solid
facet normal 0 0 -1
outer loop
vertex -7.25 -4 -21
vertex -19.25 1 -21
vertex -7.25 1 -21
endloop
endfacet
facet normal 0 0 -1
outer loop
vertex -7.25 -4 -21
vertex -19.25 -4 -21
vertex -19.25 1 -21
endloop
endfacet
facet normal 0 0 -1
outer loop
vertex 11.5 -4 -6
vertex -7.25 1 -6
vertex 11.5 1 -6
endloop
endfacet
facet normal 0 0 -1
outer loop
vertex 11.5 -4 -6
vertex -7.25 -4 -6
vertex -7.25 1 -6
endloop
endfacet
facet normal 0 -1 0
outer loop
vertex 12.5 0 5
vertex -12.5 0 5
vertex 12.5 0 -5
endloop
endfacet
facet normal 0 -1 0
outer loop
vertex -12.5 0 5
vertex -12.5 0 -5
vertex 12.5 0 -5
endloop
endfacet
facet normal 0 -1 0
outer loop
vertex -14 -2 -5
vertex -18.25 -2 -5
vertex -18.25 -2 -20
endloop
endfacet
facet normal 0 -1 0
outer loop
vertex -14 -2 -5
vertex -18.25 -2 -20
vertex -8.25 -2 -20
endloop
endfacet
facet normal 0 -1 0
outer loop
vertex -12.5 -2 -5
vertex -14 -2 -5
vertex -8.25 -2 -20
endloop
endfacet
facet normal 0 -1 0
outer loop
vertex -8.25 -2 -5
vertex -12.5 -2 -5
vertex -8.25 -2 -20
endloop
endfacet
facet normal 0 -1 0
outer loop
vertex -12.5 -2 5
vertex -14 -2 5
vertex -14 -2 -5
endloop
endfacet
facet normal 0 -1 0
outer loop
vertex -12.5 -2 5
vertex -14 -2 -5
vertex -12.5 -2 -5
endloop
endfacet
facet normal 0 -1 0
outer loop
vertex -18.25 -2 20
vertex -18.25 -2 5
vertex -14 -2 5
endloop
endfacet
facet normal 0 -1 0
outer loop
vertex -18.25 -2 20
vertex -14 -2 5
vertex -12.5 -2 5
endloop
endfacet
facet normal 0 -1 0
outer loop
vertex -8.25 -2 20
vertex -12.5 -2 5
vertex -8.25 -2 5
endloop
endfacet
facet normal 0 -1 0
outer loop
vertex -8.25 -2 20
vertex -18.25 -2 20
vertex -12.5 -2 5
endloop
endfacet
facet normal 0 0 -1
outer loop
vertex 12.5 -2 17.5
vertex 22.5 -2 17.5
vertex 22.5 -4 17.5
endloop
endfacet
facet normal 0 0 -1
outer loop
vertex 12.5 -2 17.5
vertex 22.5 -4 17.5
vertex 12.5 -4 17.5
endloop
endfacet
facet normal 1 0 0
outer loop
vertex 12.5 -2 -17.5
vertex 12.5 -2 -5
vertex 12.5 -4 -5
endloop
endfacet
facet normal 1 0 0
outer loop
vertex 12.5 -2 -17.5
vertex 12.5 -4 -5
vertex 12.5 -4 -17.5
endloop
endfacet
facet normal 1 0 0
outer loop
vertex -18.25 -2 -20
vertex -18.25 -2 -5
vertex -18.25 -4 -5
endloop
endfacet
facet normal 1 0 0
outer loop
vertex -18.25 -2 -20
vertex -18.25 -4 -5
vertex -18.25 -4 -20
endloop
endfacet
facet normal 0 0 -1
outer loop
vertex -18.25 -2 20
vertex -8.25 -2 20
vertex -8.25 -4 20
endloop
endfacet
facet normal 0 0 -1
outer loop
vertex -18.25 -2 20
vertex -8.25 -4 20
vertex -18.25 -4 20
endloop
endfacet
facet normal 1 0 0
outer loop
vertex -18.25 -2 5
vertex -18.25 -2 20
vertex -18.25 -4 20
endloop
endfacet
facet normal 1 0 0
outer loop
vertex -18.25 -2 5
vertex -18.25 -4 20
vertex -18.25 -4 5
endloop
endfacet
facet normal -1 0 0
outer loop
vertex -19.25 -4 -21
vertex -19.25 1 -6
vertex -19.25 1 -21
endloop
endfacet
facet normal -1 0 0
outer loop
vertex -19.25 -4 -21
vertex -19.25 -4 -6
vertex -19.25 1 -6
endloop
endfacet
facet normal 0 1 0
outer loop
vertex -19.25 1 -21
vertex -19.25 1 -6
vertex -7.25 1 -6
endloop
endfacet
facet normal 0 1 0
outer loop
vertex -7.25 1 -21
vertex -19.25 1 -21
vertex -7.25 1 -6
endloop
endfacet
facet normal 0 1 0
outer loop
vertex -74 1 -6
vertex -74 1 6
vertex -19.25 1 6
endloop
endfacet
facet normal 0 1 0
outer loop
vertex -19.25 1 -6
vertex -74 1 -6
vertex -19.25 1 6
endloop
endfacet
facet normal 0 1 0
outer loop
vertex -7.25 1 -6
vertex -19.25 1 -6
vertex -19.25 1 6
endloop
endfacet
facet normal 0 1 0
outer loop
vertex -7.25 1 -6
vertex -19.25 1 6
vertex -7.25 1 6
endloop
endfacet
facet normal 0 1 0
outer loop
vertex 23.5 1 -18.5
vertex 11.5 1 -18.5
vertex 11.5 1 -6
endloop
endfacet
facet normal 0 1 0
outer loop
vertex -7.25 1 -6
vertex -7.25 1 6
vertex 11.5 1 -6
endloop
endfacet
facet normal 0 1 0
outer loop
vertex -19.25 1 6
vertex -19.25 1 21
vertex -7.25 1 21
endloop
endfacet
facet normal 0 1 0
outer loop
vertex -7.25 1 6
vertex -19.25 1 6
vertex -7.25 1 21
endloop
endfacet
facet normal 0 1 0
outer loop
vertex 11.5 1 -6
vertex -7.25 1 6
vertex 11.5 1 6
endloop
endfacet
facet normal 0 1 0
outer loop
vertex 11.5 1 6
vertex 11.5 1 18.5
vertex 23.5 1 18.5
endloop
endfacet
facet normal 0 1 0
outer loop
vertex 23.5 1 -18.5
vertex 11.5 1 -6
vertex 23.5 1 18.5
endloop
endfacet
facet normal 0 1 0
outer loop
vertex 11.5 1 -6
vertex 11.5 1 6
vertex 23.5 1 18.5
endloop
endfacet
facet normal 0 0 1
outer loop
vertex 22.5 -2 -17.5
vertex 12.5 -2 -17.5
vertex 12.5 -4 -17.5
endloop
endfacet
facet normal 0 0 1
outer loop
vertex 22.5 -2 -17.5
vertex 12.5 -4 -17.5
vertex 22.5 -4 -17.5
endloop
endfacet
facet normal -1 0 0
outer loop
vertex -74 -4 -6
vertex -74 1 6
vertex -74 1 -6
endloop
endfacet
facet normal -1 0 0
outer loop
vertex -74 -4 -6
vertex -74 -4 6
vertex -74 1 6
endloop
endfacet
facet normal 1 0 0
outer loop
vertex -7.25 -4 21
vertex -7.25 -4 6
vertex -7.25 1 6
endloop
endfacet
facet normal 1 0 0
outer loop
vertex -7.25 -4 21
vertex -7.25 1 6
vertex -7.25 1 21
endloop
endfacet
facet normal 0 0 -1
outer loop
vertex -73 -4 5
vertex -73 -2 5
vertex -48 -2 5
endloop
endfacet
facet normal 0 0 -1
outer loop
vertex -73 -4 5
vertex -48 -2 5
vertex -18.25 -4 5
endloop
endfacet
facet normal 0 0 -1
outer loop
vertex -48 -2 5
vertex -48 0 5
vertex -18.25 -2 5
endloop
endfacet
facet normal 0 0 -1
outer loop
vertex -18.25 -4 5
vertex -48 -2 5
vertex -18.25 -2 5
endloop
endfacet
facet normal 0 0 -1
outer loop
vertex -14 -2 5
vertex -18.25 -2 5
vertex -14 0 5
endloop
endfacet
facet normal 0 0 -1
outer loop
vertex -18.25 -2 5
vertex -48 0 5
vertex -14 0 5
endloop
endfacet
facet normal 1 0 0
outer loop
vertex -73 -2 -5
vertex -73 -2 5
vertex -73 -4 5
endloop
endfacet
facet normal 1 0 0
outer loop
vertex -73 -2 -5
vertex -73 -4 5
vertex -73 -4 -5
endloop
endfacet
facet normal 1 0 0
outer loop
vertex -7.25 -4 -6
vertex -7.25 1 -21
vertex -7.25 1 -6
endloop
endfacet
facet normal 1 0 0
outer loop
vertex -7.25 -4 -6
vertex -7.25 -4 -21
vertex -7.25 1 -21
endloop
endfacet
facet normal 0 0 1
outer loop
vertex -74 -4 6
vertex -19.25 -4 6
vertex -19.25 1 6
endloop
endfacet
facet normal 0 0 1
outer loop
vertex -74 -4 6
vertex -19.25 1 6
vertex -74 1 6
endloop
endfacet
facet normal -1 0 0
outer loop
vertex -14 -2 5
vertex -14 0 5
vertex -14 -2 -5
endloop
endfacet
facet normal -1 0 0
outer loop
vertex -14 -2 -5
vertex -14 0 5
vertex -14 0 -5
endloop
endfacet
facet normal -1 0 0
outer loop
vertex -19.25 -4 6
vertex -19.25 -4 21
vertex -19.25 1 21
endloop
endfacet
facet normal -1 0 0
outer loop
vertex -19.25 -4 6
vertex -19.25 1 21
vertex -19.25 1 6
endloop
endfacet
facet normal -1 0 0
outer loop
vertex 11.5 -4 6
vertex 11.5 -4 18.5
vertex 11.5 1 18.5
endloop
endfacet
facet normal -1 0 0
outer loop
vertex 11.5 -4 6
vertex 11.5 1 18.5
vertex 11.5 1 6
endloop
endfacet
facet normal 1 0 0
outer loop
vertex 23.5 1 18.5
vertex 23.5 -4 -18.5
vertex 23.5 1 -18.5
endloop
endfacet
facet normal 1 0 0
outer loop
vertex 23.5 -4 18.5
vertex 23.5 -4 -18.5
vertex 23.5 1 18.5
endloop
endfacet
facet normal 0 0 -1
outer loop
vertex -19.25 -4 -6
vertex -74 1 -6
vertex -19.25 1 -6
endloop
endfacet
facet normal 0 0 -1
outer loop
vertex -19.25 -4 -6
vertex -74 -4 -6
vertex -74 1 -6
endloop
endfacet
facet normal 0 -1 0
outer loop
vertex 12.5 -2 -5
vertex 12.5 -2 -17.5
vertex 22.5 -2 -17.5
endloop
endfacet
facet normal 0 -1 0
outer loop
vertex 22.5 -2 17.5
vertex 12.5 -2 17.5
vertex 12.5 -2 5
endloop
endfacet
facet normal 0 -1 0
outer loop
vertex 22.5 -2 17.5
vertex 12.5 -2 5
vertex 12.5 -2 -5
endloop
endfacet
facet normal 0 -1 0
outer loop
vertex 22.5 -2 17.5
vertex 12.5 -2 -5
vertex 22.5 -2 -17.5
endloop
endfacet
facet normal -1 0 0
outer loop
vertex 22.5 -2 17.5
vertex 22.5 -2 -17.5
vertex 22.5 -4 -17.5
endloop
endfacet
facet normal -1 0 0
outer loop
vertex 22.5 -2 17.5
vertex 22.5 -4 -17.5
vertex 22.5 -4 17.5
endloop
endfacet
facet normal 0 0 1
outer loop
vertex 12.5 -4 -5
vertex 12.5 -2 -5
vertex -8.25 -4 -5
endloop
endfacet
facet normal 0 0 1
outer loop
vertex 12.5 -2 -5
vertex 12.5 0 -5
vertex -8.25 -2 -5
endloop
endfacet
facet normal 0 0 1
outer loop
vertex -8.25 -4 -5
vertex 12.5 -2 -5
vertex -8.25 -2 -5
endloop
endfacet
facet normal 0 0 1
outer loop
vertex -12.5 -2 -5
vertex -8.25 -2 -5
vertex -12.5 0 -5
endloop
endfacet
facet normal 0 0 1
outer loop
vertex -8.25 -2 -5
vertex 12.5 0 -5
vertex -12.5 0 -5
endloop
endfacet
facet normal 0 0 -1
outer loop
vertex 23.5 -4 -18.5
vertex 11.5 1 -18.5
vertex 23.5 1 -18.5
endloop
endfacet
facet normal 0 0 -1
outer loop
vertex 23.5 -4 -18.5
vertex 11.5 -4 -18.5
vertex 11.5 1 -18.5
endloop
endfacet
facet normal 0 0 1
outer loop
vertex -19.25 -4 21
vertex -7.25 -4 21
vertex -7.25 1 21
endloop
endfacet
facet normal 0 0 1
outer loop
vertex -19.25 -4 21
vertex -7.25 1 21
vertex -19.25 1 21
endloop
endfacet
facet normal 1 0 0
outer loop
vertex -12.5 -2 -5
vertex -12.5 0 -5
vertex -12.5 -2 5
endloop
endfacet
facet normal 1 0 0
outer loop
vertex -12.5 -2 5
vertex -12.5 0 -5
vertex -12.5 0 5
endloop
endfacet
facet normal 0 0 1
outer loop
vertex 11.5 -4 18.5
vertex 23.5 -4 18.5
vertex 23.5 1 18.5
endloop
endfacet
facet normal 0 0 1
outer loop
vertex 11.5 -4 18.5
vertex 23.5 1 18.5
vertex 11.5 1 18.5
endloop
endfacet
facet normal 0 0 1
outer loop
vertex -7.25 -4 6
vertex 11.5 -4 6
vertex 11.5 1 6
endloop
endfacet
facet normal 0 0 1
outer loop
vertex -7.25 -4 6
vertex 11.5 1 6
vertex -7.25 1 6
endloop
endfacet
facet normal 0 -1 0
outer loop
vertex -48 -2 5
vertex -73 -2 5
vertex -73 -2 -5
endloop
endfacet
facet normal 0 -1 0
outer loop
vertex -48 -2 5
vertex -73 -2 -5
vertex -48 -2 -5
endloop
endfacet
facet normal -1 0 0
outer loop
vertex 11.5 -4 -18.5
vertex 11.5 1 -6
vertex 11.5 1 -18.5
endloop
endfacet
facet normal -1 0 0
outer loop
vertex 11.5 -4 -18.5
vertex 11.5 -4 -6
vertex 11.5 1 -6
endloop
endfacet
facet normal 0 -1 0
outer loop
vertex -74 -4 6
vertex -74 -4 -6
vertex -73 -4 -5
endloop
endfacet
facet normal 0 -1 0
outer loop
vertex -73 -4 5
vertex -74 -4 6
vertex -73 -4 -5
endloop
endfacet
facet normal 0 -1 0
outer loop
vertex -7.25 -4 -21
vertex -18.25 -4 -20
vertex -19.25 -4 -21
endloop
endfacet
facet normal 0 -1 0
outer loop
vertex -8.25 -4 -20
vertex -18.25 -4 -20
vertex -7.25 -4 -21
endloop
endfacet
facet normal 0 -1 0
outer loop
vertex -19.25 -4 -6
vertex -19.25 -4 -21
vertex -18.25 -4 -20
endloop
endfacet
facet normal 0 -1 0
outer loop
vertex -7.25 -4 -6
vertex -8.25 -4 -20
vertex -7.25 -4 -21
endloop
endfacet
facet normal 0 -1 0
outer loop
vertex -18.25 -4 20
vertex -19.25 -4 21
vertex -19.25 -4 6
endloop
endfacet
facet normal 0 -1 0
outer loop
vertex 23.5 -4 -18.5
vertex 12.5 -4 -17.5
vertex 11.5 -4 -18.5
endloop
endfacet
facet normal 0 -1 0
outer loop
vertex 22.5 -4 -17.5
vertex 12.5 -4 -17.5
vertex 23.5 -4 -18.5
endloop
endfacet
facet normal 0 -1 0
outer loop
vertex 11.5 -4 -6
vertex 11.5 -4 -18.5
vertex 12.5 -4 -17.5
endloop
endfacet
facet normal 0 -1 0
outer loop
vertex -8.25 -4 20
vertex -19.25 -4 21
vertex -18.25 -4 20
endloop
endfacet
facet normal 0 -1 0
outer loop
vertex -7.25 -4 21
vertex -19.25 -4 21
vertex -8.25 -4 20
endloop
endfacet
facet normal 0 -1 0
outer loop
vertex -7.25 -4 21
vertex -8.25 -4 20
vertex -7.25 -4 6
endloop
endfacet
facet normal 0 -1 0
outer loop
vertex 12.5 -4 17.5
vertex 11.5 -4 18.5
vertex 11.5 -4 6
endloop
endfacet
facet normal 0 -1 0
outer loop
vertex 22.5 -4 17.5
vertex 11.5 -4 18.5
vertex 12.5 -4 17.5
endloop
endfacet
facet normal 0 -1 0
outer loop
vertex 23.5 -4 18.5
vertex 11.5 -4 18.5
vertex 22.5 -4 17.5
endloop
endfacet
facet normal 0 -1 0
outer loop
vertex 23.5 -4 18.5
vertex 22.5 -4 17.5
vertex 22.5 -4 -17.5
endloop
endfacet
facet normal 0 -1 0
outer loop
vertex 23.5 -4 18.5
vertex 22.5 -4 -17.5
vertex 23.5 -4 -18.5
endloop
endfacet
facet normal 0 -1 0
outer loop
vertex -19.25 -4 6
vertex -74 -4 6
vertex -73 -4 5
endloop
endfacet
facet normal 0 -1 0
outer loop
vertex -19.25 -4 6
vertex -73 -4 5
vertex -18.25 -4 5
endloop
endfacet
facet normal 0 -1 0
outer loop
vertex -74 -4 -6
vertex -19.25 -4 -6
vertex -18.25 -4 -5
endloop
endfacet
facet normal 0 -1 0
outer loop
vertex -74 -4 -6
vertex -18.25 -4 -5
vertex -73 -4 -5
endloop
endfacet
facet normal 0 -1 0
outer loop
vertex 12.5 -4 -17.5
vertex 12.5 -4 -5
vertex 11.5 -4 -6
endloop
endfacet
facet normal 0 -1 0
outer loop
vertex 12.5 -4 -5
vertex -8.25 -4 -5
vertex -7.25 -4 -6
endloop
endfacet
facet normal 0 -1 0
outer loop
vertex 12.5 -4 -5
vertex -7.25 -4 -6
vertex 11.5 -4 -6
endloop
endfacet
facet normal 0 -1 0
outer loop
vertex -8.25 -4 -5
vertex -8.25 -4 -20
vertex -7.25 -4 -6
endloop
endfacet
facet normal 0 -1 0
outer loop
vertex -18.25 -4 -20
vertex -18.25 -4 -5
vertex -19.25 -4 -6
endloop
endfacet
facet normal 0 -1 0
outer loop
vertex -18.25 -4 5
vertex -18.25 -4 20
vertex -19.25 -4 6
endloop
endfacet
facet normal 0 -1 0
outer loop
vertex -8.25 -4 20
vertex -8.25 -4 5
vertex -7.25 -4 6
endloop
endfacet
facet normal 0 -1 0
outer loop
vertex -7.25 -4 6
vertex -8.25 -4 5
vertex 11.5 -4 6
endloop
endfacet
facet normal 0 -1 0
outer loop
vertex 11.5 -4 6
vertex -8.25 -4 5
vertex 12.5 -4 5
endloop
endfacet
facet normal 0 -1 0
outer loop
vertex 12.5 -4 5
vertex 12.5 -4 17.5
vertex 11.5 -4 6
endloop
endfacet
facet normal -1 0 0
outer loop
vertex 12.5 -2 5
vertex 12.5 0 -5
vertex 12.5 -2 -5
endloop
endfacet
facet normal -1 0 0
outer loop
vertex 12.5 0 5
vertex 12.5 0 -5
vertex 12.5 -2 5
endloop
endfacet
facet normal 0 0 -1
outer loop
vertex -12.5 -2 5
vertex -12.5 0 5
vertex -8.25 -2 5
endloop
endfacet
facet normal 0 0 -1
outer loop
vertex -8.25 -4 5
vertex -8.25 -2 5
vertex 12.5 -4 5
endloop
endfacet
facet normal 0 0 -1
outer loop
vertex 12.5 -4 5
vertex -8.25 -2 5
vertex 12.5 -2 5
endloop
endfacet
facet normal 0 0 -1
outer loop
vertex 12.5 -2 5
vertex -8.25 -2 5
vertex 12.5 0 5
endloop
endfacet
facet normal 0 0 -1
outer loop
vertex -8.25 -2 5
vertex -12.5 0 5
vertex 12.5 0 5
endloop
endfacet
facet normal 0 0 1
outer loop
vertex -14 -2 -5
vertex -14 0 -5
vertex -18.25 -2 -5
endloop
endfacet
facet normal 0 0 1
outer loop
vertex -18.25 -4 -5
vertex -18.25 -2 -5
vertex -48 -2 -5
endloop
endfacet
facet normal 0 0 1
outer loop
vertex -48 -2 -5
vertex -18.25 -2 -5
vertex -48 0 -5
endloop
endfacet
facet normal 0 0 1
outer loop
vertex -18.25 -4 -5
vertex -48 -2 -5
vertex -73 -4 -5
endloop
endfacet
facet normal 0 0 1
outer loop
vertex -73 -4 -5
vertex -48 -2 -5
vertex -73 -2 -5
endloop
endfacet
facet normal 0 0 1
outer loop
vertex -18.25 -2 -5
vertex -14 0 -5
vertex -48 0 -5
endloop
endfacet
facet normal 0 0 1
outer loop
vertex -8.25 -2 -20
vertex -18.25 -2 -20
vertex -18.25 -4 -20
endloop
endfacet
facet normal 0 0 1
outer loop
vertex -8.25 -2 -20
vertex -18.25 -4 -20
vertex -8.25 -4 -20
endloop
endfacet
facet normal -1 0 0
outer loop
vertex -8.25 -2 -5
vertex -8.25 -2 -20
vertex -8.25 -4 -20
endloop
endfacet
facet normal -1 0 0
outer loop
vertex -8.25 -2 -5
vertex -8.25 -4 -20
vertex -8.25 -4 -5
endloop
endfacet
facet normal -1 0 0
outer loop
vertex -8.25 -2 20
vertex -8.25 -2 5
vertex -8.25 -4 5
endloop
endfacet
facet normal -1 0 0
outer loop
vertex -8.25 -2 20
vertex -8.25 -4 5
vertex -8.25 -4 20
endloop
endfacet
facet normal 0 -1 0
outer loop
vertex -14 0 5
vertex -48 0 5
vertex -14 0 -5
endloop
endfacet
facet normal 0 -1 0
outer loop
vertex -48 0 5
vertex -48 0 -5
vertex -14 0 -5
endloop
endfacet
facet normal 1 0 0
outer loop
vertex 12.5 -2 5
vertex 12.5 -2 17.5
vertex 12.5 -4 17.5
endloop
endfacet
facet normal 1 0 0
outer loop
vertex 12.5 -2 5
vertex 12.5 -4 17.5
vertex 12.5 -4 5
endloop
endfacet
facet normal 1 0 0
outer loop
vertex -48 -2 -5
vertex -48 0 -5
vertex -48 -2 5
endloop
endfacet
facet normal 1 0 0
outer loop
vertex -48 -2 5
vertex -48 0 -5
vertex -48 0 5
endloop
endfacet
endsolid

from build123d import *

# Parameters (mm, degrees)
SKETCH_3_W           = 10
SKETCH_3_H           = 35
SKETCH_3_W_2         = 20.75
SKETCH_3_H_2         = 10
SKETCH_3_W_3         = 29.75
SKETCH_3_W_4         = 25
EXTRUDE_1_DEPTH      = 1
EXTRUDE_2_DEPTH      = 4
EXTRUDE_2_DEPTH_BACK = 1
SKETCH_5_W           = 25
SKETCH_5_H           = 10
SKETCH_5_W_2         = 10
SKETCH_5_H_2         = 35
EXTRUDE_3_DEPTH      = 2


with BuildPart() as part:
    # 草图3 → 凸台-拉伸1 (new body)
    with BuildSketch(Plane(origin=(0, 0, 0), x_dir=(1, 0, 0), z_dir=(0, 1, 0))):
        with Locations((17.5, 0)):
            Rectangle(SKETCH_3_W, SKETCH_3_H)
        with Locations((2.125, 0)):
            Rectangle(SKETCH_3_W_2, SKETCH_3_H_2)
        Polygon((-8.25, -5), (-8.25, 5), (-8.25, 20), (-18.25, 20), (-18.25, 5), (-18.25, -5), (-18.25, -20), (-8.25, -20), align=None)
        with Locations((-33.125, 0)):
            Rectangle(SKETCH_3_W_3, SKETCH_3_H_2)
        with Locations((-60.5, 0)):
            Rectangle(SKETCH_3_W_4, SKETCH_3_H_2)
    extrude(amount=EXTRUDE_1_DEPTH)

    # 草图4 → 凸台-拉伸2 (add, two sides)
    with BuildSketch(Plane.XZ) as extrude_2_sk:
        Polygon((11.5, -18.5), (23.5, -18.5), (23.5, 18.5), (11.5, 18.5), (11.5, 6), (-7.25, 6), (-7.25, 21), (-19.25, 21), (-19.25, 6), (-74, 6), (-74, -6), (-19.25, -6), (-19.25, -21), (-7.25, -21), (-7.25, -6), (11.5, -6), align=None)
        Polygon((12.5, -17.5), (22.5, -17.5), (22.5, 17.5), (12.5, 17.5), (12.5, 5), (-8.25, 5), (-8.25, 20), (-18.25, 20), (-18.25, 5), (-73, 5), (-73, -5), (-18.25, -5), (-18.25, -20), (-8.25, -20), (-8.25, -5), (12.5, -5), align=None, mode=Mode.SUBTRACT)
    extrude(amount=EXTRUDE_2_DEPTH)
    extrude(extrude_2_sk.sketch, amount=-EXTRUDE_2_DEPTH_BACK)

    # 草图5 → 凸台-拉伸3 (add)
    with BuildSketch(Plane.XZ):
        Polygon((-18.25, 20), (-18.25, 5), (-14, 5), (-14, -5), (-18.25, -5), (-18.25, -20), (-8.25, -20), (-8.25, -5), (-12.5, -5), (-12.5, 5), (-8.25, 5), (-8.25, 20), align=None)
        with Locations((-60.5, 0)):
            Rectangle(SKETCH_5_W, SKETCH_5_H)
        with Locations((17.5, 0)):
            Rectangle(SKETCH_5_W_2, SKETCH_5_H_2)
    extrude(amount=EXTRUDE_3_DEPTH)


solid = part.part
